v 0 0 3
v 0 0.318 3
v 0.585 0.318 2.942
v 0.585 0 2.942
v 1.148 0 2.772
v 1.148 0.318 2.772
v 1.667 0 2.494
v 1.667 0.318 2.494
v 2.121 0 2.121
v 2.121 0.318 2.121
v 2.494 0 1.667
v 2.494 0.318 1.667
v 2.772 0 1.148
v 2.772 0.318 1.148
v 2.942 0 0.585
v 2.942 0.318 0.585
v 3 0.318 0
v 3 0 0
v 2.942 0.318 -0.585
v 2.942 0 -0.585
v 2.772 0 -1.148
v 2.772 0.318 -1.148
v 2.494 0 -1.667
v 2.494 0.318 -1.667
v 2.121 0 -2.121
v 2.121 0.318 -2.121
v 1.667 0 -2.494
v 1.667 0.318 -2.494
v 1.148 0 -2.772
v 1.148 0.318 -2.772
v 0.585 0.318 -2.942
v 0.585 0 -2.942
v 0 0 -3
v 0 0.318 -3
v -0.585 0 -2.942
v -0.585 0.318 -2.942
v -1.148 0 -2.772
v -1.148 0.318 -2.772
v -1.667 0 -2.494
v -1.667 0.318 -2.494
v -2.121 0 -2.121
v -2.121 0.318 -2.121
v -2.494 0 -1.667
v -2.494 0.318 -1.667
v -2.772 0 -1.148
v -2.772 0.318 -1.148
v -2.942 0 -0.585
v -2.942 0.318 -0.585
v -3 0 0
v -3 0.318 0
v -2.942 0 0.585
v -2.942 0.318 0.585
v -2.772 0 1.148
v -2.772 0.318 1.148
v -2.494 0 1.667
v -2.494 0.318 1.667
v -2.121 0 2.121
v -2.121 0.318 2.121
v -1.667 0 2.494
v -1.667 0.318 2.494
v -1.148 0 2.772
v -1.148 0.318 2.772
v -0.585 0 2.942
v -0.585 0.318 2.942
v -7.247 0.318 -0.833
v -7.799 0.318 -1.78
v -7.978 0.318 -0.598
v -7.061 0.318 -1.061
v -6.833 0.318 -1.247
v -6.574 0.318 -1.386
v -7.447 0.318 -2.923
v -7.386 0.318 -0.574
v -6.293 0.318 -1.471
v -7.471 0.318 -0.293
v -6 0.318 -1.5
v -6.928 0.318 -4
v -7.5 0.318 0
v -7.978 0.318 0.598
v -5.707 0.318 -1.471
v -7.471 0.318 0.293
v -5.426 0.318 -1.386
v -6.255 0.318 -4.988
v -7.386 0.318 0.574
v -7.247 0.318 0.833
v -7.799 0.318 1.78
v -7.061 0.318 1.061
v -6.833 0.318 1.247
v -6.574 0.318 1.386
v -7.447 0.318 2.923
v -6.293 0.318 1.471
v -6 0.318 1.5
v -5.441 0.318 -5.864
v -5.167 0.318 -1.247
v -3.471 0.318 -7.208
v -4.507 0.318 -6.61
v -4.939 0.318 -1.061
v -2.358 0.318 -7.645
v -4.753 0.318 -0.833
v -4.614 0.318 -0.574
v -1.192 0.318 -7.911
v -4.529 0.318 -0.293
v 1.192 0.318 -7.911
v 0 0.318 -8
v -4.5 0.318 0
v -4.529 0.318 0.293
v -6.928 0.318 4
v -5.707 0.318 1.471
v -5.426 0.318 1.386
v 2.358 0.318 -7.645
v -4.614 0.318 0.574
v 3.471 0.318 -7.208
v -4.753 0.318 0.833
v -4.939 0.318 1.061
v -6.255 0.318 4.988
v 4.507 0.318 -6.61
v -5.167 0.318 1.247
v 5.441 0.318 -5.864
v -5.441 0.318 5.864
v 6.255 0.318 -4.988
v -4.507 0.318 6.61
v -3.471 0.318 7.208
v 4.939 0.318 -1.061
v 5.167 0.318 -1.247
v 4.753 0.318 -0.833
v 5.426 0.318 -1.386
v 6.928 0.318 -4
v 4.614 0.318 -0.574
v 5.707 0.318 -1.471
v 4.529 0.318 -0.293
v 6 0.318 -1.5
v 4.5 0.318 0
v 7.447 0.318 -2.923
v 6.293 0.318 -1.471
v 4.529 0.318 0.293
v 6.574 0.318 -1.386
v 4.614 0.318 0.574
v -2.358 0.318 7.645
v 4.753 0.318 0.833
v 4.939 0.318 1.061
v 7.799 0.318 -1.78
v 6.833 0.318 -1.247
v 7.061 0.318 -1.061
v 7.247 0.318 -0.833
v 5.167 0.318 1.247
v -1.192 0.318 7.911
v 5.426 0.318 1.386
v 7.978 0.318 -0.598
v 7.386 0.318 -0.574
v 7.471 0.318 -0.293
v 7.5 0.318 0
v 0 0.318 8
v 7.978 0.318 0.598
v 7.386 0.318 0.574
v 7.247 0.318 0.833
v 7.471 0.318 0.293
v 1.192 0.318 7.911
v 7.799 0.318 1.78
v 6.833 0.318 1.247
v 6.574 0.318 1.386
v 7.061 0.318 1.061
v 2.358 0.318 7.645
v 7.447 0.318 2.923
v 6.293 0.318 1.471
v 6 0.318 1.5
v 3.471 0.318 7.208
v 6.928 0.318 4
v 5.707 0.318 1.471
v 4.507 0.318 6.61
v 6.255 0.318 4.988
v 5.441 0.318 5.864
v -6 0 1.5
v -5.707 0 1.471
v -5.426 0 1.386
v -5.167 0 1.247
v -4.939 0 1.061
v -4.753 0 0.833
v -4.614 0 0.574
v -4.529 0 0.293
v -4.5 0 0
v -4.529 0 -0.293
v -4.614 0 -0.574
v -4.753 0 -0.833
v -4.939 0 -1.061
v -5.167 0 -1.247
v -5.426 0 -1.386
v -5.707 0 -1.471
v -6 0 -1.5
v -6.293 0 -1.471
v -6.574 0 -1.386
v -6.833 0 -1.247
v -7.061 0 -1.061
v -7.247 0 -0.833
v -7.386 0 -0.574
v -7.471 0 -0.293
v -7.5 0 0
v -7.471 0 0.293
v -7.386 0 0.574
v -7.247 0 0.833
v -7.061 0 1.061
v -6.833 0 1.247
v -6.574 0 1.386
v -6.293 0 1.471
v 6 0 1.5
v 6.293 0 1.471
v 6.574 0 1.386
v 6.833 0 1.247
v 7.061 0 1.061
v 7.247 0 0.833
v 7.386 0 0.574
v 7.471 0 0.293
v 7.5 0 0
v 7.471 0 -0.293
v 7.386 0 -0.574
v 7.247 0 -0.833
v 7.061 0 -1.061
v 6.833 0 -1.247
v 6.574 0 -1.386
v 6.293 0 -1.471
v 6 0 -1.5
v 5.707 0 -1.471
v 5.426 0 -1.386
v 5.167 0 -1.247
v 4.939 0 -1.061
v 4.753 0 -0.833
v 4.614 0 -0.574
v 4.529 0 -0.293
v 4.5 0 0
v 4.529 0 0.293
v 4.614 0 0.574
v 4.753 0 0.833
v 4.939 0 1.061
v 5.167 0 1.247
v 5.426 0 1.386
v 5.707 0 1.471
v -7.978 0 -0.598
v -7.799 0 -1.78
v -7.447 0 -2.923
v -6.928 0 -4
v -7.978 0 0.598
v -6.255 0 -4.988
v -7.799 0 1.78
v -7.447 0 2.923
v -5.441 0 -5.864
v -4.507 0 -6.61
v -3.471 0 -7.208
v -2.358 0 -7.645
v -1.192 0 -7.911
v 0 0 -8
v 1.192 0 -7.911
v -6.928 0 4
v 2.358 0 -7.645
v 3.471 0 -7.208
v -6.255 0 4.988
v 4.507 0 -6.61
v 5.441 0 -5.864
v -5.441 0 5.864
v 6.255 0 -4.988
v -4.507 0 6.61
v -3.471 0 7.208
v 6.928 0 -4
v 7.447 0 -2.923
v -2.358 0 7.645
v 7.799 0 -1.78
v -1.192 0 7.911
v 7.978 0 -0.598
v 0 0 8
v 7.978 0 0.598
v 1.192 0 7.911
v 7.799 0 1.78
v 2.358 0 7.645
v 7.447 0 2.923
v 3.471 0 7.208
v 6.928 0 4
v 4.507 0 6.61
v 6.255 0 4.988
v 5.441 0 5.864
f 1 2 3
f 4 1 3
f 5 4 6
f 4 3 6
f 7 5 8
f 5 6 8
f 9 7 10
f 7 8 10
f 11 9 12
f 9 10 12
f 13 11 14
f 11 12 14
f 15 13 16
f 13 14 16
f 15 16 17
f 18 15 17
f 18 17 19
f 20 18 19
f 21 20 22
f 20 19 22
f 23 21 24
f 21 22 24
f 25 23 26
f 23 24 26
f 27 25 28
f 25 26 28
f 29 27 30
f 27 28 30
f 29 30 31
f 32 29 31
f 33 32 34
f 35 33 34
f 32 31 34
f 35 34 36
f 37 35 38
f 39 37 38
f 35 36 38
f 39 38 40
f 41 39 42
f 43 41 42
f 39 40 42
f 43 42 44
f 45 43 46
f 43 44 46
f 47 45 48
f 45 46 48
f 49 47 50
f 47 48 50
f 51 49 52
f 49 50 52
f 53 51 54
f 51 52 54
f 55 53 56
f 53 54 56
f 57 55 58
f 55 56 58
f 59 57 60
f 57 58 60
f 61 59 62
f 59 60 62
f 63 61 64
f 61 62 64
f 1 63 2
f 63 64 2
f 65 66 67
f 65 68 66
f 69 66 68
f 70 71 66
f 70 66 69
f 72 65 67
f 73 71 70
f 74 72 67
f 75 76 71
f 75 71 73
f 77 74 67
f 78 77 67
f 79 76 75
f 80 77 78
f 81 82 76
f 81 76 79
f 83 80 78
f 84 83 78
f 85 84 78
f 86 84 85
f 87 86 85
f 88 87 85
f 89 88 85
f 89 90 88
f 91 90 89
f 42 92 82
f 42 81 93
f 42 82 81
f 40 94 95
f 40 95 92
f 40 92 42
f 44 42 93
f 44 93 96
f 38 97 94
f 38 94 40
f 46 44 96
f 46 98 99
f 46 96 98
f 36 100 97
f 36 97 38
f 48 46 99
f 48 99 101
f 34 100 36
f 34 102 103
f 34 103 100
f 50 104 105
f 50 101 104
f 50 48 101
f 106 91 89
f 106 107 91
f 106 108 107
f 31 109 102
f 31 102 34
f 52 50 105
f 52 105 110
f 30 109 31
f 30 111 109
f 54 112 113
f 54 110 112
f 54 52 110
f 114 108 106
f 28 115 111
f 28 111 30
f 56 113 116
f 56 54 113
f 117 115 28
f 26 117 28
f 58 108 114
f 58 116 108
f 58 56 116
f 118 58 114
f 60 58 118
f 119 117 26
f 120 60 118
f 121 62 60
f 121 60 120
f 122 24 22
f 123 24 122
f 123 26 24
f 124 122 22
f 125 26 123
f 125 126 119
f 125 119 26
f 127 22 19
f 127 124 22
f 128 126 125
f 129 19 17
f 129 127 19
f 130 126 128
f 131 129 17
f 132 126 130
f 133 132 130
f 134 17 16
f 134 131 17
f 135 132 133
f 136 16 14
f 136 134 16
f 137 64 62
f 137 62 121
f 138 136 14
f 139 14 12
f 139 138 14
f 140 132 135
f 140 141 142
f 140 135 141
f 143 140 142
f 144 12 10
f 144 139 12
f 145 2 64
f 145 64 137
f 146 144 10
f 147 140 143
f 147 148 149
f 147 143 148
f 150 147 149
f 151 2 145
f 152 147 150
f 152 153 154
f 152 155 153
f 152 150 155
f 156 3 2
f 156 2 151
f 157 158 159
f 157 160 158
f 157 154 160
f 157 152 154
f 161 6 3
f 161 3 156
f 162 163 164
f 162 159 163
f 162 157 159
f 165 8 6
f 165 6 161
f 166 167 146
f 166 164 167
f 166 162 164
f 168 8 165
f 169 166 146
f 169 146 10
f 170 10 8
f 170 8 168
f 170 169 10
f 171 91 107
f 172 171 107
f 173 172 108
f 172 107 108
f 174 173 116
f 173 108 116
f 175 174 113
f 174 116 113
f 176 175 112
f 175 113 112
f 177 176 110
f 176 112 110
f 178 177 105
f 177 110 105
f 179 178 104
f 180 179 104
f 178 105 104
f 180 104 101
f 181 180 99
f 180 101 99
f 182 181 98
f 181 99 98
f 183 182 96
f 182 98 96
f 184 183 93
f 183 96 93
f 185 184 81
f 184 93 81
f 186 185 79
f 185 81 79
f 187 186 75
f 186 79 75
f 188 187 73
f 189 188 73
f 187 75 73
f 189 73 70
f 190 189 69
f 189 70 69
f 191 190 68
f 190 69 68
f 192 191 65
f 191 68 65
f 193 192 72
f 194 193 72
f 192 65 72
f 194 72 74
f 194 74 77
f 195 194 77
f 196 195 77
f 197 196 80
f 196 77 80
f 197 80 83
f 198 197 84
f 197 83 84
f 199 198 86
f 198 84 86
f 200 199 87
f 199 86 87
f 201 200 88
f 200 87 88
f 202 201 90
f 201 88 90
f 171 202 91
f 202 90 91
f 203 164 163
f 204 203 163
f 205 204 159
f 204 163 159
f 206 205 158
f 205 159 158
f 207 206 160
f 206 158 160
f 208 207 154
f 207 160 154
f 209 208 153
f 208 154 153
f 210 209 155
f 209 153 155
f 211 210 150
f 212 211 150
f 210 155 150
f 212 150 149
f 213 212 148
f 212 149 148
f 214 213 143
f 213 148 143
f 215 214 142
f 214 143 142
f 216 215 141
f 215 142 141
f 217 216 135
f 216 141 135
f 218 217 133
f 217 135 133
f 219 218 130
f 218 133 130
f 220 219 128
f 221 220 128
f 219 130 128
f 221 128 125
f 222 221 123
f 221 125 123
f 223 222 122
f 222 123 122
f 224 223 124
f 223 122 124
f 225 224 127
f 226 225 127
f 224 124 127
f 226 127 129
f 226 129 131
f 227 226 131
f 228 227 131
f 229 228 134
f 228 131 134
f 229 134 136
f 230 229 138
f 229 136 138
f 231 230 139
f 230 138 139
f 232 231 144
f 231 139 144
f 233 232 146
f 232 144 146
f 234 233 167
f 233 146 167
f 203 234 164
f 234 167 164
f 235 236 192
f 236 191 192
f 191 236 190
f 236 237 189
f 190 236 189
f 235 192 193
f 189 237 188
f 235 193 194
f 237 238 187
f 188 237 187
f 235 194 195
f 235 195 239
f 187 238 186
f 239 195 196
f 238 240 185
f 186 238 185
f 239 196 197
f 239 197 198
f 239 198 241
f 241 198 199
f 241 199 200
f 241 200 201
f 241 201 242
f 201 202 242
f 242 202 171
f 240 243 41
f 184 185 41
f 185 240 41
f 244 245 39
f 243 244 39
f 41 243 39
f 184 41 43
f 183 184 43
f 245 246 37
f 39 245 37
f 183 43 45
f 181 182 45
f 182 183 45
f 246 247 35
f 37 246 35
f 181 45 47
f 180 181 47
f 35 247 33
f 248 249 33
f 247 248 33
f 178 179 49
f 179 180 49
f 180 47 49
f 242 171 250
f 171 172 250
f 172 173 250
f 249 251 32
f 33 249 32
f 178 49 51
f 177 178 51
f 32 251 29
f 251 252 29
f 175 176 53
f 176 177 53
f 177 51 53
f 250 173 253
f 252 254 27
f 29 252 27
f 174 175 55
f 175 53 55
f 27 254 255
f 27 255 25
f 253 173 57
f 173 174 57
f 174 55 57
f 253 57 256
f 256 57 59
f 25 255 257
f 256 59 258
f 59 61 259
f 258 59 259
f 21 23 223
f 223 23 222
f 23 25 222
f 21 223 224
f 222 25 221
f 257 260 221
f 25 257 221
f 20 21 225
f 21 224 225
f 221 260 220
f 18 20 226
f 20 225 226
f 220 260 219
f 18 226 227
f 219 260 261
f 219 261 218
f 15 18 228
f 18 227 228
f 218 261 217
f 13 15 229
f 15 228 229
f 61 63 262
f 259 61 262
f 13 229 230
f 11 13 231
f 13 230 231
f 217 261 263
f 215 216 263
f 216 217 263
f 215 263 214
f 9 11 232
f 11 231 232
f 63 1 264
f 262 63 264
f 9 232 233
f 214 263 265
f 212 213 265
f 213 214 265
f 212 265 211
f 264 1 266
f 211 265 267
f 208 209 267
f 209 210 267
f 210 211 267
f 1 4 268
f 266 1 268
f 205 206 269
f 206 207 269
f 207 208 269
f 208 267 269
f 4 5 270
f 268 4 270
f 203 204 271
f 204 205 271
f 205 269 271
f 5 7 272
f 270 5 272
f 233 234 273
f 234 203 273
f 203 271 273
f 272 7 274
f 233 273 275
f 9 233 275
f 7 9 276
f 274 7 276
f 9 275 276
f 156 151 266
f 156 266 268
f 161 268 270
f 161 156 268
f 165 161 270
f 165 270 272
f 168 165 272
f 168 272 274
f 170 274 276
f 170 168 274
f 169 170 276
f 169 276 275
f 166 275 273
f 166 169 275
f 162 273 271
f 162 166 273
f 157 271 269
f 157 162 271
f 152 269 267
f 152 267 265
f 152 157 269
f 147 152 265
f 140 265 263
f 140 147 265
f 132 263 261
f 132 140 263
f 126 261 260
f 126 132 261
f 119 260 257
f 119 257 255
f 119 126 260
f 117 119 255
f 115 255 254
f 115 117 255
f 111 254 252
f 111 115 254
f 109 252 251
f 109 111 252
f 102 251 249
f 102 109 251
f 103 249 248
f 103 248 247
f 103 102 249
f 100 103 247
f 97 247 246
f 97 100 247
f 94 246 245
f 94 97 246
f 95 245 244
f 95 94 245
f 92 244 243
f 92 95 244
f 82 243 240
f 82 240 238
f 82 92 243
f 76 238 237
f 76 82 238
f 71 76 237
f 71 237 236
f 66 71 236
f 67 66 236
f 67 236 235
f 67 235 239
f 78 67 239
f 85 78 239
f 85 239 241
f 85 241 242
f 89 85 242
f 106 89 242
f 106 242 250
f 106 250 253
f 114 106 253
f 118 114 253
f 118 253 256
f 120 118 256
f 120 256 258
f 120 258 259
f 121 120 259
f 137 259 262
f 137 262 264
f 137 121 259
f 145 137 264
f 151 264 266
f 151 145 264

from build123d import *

# Parameters (mm, degrees)
SKETCH1_R           = 7
BOSS_EXTRUDE1_DEPTH = 0.3175
SKETCH2_R           = 8
BOSS_EXTRUDE3_DEPTH = 0.3175
SKETCH3_R           = 1.5
CUT_EXTRUDE2_DEPTH  = 0.3175
SKETCH4_R           = 1.5
CUT_EXTRUDE3_DEPTH  = 0.3175
SKETCH5_R           = 3
CUT_EXTRUDE4_DEPTH  = 0.3175


with BuildPart() as part:
    # Sketch1 → Boss-Extrude1 (new body)
    with BuildSketch(Plane(origin=(0, 0, 0), x_dir=(1, 0, 0), z_dir=(0, 1, 0))):
        with Locations(Location((0, 0, 0), (0, 0, 270))):
            Circle(SKETCH1_R)
    extrude(amount=BOSS_EXTRUDE1_DEPTH)

    # Sketch2 → Boss-Extrude3 (add)
    with BuildSketch(Plane(origin=(0, 0.3175, 0), x_dir=(1, 0, 0), z_dir=(0, 1, 0))):
        with Locations(Location((0, 0, 0), (0, 0, 270))):
            Circle(SKETCH2_R)
    extrude(amount=-BOSS_EXTRUDE3_DEPTH)

    # Sketch3 → Cut-Extrude2 (cut)
    with BuildSketch(Plane(origin=(0, 0.3175, 0), x_dir=(1, 0, 0), z_dir=(0, 1, 0))):
        with Locations(Location((6, 0, 0), (0, 0, 270))):
            Circle(SKETCH3_R)
    extrude(amount=-CUT_EXTRUDE2_DEPTH, mode=Mode.SUBTRACT)

    # Sketch4 → Cut-Extrude3 (cut)
    with BuildSketch(Plane(origin=(0, 0.3175, 0), x_dir=(1, 0, 0), z_dir=(0, 1, 0))):
        with Locations(Location((-6, 0, 0), (0, 0, 270))):
            Circle(SKETCH4_R)
    extrude(amount=-CUT_EXTRUDE3_DEPTH, mode=Mode.SUBTRACT)

    # Sketch5 → Cut-Extrude4 (cut)
    with BuildSketch(Plane(origin=(0, 0.3175, 0), x_dir=(1, 0, 0), z_dir=(0, 1, 0))):
        with Locations(Location((0, 0, 0), (0, 0, 270))):
            Circle(SKETCH5_R)
    extrude(amount=-CUT_EXTRUDE4_DEPTH, mode=Mode.SUBTRACT)


solid = part.part
